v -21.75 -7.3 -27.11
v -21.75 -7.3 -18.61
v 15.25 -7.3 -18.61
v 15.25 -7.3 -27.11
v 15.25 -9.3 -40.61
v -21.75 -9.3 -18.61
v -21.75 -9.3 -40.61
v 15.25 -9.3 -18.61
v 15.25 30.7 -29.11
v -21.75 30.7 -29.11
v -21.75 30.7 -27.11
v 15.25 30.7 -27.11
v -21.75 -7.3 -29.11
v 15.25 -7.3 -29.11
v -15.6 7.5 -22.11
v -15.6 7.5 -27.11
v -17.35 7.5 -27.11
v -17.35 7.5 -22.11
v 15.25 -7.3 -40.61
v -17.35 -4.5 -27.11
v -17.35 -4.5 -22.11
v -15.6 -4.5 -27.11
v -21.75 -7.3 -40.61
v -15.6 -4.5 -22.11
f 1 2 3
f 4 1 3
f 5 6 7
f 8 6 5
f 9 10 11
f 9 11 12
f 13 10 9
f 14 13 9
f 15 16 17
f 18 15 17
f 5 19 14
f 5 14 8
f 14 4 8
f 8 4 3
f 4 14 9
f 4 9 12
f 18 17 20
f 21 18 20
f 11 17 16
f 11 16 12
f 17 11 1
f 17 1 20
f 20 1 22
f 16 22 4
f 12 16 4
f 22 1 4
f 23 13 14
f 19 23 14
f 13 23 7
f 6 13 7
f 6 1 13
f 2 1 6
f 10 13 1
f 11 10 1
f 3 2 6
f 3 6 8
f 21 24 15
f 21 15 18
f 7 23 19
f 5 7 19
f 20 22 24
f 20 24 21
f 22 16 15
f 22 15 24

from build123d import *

# Parameters (mm, degrees)
SKETCH024_W  = 37
SKETCH024_H  = 22
PAD013_DEPTH = 2
SKETCH025_W  = 37
SKETCH025_H  = 2
PAD014_DEPTH = 38
SKETCH027_W  = 1.75
SKETCH027_H  = 12
PAD015_DEPTH = 5


with BuildPart() as part:
    # Sketch024 → Pad013 (new body)
    with BuildSketch(Plane.XZ.offset(7.3)):
        with Locations((-3.25, -29.610007)):
            Rectangle(SKETCH024_W, SKETCH024_H)
    extrude(amount=PAD013_DEPTH)

    # Sketch025 (on Face5 of Pad013) → Pad014 (join)
    with BuildSketch(Plane(origin=(0, -7.3, 0), x_dir=(1, 0, 0), z_dir=(0, 1, 0))):
        with Locations((-3.25, 28.110007)):
            Rectangle(SKETCH025_W, SKETCH025_H)
    extrude(amount=PAD014_DEPTH)

    # Sketch027 (on Face6 of Pad014) → Pad015 (join)
    with BuildSketch(Plane(origin=(0, 0, -27.110007), x_dir=(-1, 0, 0), z_dir=(0, 0, 1))):
        with Locations((16.475, -1.5)):
            Rectangle(SKETCH027_W, SKETCH027_H)
    extrude(amount=PAD015_DEPTH)


solid = part.part
